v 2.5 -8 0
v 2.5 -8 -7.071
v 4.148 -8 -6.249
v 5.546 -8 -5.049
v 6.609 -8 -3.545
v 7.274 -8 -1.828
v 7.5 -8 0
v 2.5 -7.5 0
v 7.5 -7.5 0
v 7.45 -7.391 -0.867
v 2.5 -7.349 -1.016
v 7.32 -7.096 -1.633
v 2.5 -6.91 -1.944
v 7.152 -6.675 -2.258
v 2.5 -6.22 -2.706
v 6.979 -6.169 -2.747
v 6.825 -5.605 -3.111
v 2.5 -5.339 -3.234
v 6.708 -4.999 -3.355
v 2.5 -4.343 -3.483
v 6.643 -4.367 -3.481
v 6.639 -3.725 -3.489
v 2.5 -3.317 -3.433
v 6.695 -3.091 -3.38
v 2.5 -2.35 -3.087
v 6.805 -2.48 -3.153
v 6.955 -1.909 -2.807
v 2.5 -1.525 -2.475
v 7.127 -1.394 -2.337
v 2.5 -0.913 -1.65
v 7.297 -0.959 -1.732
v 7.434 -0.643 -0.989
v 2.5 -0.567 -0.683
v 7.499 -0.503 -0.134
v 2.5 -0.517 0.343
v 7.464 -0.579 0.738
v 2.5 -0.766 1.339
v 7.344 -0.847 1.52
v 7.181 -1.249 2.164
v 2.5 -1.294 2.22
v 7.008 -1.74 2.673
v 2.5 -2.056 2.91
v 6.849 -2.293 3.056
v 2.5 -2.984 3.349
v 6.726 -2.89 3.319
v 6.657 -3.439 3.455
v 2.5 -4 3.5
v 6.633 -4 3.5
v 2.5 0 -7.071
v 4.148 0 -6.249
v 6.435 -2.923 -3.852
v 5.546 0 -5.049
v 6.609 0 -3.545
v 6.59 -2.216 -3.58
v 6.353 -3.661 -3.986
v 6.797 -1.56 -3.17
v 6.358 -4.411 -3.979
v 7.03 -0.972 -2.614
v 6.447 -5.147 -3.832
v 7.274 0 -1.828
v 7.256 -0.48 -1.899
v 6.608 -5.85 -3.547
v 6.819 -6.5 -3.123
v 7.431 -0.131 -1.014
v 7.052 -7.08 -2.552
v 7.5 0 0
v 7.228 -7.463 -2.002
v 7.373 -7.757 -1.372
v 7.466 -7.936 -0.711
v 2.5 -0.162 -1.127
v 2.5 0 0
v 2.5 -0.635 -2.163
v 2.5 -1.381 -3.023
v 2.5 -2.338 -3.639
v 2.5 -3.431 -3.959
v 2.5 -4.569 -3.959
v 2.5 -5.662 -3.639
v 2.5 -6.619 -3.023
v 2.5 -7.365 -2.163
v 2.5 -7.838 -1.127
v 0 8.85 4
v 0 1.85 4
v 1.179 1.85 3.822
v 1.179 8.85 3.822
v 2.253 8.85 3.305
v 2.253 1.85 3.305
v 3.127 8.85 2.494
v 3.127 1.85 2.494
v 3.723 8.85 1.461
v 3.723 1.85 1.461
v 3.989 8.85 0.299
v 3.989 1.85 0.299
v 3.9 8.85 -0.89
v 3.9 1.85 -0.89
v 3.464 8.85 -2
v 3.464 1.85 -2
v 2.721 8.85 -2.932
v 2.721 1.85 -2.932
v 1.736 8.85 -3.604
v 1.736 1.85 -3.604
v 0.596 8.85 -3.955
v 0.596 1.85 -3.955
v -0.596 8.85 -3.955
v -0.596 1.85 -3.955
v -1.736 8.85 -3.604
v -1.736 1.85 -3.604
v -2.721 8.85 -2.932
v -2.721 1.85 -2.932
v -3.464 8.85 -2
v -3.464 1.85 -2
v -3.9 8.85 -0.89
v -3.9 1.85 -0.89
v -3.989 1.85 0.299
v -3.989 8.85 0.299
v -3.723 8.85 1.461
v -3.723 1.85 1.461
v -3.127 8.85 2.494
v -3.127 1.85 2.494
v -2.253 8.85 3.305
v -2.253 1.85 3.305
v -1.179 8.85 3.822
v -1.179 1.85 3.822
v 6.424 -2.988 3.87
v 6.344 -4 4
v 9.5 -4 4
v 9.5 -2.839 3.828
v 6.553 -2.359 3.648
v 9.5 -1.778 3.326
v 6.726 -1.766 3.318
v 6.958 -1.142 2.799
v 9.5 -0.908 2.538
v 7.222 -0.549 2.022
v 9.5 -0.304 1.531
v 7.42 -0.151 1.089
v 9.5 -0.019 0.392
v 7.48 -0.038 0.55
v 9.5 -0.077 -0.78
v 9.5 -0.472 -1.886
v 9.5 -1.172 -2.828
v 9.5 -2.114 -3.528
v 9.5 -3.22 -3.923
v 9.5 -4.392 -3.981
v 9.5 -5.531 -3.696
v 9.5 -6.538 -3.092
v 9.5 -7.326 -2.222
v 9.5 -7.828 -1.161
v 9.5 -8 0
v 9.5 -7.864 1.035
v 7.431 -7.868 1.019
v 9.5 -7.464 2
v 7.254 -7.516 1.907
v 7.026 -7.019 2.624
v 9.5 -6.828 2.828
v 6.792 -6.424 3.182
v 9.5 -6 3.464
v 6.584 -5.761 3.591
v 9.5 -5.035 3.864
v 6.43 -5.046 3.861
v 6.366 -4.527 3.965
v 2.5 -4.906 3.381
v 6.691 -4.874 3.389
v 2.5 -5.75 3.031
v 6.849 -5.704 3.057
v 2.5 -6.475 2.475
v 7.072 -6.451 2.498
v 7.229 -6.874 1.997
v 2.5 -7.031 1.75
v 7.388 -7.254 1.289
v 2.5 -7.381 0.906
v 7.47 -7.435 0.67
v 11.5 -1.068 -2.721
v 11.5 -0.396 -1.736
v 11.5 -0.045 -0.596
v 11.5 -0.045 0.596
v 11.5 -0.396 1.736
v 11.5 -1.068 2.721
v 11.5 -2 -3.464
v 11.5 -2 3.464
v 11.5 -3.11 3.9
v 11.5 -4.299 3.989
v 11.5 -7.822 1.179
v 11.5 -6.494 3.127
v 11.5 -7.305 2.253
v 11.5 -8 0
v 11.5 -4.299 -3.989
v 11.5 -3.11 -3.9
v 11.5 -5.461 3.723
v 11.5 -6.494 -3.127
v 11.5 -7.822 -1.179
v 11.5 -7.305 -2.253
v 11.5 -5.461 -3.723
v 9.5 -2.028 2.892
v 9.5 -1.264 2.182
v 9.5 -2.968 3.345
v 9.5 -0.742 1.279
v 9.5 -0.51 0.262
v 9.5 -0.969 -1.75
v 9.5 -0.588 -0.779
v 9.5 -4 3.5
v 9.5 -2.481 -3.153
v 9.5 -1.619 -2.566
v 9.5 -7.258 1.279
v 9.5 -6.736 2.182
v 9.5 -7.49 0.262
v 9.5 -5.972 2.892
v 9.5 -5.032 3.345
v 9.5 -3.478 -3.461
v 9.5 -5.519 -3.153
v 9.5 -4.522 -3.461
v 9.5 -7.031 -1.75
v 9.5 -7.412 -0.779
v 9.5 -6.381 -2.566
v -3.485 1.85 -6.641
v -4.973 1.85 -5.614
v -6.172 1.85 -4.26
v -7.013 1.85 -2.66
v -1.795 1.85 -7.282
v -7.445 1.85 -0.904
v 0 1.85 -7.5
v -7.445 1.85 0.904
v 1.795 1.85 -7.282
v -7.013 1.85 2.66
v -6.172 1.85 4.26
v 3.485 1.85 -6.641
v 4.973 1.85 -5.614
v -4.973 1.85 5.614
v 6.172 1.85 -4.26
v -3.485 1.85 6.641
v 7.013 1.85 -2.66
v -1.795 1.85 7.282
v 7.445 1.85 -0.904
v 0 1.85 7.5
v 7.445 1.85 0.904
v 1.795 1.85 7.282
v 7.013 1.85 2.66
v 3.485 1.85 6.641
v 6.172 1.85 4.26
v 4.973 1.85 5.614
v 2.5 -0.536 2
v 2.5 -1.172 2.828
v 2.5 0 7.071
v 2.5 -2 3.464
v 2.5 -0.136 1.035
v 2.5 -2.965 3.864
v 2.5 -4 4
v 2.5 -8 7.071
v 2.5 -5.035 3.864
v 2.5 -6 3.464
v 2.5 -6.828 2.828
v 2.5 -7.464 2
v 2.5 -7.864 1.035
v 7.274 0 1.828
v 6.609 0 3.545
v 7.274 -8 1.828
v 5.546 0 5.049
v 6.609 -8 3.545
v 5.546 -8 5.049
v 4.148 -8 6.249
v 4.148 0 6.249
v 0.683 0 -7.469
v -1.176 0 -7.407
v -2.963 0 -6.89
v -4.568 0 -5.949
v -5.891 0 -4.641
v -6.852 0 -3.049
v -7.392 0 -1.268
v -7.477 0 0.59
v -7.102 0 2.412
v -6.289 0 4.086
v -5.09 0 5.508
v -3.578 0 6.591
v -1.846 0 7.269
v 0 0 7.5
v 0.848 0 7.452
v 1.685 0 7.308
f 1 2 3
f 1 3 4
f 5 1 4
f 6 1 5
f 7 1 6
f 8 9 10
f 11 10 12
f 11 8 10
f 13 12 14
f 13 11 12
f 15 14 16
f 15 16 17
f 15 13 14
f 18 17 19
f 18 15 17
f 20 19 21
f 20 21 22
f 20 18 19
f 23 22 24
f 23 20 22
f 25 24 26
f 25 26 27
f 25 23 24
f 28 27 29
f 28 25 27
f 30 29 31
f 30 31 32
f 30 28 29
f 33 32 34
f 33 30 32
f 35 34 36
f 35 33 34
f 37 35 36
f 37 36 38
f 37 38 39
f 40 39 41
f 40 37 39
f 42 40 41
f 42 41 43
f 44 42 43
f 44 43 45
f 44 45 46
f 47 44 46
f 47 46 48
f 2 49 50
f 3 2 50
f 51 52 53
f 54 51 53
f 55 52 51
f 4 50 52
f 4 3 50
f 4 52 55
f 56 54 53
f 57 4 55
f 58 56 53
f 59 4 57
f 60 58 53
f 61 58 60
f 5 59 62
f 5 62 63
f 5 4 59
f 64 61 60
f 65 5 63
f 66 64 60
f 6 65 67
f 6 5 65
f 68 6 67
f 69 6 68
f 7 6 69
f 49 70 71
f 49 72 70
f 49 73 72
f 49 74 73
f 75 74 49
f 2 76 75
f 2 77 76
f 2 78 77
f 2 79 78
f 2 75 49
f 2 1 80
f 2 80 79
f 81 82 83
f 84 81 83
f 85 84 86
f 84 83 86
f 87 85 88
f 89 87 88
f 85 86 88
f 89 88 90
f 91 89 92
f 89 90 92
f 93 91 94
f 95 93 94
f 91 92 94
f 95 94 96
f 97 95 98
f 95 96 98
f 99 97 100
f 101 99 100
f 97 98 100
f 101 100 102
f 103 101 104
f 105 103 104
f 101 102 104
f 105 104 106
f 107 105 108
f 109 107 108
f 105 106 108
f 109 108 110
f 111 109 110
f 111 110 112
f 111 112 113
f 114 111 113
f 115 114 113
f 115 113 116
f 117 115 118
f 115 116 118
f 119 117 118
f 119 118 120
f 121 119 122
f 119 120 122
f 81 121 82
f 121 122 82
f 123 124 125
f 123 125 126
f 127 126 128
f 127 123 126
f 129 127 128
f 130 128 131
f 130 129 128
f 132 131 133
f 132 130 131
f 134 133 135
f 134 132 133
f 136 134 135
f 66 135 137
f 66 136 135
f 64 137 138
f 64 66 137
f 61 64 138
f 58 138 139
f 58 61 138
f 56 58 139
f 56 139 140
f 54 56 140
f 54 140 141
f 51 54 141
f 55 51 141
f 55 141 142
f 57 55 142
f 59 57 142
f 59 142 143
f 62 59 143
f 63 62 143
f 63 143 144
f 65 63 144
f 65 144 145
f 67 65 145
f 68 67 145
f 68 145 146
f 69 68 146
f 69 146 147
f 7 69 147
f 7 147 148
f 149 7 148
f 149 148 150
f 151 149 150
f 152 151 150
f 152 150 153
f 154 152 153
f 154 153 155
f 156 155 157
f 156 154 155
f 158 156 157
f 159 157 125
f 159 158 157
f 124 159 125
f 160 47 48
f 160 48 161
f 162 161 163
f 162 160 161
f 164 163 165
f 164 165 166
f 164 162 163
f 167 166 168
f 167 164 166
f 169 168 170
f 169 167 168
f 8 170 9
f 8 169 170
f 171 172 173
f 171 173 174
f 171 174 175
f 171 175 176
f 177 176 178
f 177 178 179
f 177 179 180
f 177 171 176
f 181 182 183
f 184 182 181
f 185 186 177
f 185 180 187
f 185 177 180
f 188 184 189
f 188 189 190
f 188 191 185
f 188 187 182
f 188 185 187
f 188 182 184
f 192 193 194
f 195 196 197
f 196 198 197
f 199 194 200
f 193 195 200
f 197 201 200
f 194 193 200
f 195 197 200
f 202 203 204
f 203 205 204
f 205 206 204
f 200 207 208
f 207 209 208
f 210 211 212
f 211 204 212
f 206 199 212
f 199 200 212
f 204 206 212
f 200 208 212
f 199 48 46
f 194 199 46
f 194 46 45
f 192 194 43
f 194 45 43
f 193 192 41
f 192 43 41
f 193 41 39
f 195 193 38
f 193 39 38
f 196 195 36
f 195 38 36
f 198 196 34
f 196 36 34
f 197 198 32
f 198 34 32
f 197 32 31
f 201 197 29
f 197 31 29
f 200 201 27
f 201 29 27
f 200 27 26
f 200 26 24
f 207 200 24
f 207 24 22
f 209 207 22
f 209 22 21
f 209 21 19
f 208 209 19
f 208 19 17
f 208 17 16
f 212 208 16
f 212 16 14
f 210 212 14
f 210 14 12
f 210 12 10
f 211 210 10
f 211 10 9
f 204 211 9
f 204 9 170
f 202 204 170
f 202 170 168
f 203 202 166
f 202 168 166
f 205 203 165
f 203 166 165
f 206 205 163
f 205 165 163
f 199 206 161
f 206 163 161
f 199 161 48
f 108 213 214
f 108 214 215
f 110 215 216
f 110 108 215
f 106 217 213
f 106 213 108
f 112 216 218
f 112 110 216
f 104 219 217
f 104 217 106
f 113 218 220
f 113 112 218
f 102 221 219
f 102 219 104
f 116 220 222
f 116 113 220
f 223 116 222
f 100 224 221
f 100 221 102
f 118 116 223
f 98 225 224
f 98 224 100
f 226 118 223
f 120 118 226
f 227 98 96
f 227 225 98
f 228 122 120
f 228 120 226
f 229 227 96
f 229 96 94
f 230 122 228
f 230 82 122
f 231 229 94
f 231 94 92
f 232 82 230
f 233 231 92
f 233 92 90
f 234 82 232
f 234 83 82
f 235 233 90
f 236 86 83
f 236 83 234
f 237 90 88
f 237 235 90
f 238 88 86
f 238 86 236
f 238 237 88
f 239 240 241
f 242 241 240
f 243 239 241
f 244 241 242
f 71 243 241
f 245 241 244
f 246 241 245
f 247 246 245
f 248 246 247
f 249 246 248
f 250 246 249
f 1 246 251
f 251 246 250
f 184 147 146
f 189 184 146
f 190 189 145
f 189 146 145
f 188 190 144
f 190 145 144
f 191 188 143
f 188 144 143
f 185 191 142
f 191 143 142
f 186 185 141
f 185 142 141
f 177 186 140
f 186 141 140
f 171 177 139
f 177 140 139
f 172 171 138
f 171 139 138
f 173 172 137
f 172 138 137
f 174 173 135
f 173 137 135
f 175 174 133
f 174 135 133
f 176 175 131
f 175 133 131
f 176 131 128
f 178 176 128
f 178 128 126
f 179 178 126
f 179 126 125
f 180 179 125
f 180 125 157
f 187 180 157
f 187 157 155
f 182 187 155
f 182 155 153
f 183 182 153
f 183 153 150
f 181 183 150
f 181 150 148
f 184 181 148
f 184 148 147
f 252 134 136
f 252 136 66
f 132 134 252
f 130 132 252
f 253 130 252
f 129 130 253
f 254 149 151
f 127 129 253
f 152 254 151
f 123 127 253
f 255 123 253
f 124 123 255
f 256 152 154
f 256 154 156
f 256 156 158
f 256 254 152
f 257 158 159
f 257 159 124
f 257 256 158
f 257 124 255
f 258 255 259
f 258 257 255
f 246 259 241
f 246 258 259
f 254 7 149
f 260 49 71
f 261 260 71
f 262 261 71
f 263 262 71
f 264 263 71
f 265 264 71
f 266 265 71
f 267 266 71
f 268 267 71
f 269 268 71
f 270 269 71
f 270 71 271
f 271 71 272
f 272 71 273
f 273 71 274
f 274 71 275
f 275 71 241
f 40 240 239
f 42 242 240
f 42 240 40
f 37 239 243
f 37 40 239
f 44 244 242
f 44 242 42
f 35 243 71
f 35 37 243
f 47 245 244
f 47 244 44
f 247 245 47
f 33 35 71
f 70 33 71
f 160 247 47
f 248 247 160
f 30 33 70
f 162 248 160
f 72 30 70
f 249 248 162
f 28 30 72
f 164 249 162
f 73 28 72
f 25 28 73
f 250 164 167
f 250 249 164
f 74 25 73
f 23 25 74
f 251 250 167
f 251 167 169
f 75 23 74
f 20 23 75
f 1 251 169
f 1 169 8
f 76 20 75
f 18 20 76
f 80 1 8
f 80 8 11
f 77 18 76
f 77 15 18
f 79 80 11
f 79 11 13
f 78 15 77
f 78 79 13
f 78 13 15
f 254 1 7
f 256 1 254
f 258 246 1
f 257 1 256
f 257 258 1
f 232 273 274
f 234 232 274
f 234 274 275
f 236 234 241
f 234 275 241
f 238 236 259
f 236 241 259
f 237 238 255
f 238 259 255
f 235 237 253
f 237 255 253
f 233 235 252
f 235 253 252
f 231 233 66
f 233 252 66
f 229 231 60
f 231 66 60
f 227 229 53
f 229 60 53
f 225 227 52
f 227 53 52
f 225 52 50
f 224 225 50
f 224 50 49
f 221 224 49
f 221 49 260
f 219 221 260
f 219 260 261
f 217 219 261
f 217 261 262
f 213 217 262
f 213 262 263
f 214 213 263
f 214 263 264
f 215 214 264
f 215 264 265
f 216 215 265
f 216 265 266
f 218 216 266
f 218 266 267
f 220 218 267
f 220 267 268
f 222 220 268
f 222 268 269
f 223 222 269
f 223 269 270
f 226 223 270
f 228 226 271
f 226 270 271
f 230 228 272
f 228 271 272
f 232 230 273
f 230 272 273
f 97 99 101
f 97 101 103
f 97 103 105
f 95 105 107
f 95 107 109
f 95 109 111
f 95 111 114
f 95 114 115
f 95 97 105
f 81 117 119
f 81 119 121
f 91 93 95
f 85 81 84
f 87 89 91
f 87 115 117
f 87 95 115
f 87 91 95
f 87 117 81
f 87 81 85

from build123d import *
from build123d.topology import SkipClean

# Parameters (mm, degrees)
SKETCH1_R           = 7.5
BOSS_EXTRUDE1_DEPTH = 1.85
BOSS_EXTRUDE2_START = 8
BOSS_EXTRUDE2_DEPTH = 8
SKETCH4_R           = 3.5
CUT_EXTRUDE1_DEPTH  = 14.285330256
SKETCH5_R           = 4
SKETCH5_R_2         = 3.5
BOSS_EXTRUDE3_DEPTH = 7
SKETCH6_R           = 4
BOSS_EXTRUDE4_DEPTH = 7
SKETCH7_R           = 4
BOSS_EXTRUDE5_DEPTH = 2


with BuildPart() as part:
    # Sketch1 → Boss-Extrude1 (new body)
    with BuildSketch(Plane(origin=(0, 0, 0), x_dir=(1, 0, 0), z_dir=(0, 1, 0))):
        with Locations(Location((0, 0, 0), (0, 0, 270))):
            Circle(SKETCH1_R)
    extrude(amount=BOSS_EXTRUDE1_DEPTH)

    # Sketch2 → Boss-Extrude2 (add)
    with SkipClean():  # the faces are left unmerged after this step: merging them gives an invalid solid
        with BuildSketch(Plane.XZ.offset(BOSS_EXTRUDE2_START)):
            with BuildLine():
                Line((2.5, 7.071067812), (2.5, -7.071067812))
                ThreePointArc((2.5, -7.071067812), (7.5, 0), (2.5, 7.071067812))
            make_face()
        extrude(amount=-BOSS_EXTRUDE2_DEPTH)

    # Sketch4 → Cut-Extrude1 (cut, through all)
    with SkipClean():  # the faces are left unmerged after this step: merging them gives an invalid solid
        with BuildSketch(Plane(origin=(0, 0, 0), x_dir=(0, 0, -1), z_dir=(1, 0, 0))):
            with Locations(Location((0, -4, 0), (0, 0, 270))):
                Circle(SKETCH4_R)
        extrude(amount=CUT_EXTRUDE1_DEPTH, mode=Mode.SUBTRACT)

    # Sketch5 → Boss-Extrude3 (add)
    with SkipClean():  # the faces are left unmerged after this step: merging them gives an invalid solid
        with BuildSketch(Plane.ZY.offset(-2.5)):
            with Locations((0, -4)):
                Circle(SKETCH5_R)
            with Locations((0, -4)):
                Circle(SKETCH5_R_2, mode=Mode.SUBTRACT)
        extrude(amount=-BOSS_EXTRUDE3_DEPTH)

    # Sketch6 → Boss-Extrude4 (add)
    with SkipClean():  # the faces are left unmerged after this step: merging them gives an invalid solid
        with BuildSketch(Plane(origin=(0, 1.85, 0), x_dir=(1, 0, 0), z_dir=(0, 1, 0))):
            with Locations(Location((0, 0, 0), (0, 0, 270))):
                Circle(SKETCH6_R)
        extrude(amount=BOSS_EXTRUDE4_DEPTH)

    # Sketch7 → Boss-Extrude5 (add)
    with SkipClean():  # the faces are left unmerged after this step: merging them gives an invalid solid
        with BuildSketch(Plane(origin=(9.5, 0, 0), x_dir=(0, 0, -1), z_dir=(1, 0, 0))):
            with Locations(Location((0, -4, 0), (0, 0, 270))):
                Circle(SKETCH7_R)
        extrude(amount=BOSS_EXTRUDE5_DEPTH)


solid = part.part
